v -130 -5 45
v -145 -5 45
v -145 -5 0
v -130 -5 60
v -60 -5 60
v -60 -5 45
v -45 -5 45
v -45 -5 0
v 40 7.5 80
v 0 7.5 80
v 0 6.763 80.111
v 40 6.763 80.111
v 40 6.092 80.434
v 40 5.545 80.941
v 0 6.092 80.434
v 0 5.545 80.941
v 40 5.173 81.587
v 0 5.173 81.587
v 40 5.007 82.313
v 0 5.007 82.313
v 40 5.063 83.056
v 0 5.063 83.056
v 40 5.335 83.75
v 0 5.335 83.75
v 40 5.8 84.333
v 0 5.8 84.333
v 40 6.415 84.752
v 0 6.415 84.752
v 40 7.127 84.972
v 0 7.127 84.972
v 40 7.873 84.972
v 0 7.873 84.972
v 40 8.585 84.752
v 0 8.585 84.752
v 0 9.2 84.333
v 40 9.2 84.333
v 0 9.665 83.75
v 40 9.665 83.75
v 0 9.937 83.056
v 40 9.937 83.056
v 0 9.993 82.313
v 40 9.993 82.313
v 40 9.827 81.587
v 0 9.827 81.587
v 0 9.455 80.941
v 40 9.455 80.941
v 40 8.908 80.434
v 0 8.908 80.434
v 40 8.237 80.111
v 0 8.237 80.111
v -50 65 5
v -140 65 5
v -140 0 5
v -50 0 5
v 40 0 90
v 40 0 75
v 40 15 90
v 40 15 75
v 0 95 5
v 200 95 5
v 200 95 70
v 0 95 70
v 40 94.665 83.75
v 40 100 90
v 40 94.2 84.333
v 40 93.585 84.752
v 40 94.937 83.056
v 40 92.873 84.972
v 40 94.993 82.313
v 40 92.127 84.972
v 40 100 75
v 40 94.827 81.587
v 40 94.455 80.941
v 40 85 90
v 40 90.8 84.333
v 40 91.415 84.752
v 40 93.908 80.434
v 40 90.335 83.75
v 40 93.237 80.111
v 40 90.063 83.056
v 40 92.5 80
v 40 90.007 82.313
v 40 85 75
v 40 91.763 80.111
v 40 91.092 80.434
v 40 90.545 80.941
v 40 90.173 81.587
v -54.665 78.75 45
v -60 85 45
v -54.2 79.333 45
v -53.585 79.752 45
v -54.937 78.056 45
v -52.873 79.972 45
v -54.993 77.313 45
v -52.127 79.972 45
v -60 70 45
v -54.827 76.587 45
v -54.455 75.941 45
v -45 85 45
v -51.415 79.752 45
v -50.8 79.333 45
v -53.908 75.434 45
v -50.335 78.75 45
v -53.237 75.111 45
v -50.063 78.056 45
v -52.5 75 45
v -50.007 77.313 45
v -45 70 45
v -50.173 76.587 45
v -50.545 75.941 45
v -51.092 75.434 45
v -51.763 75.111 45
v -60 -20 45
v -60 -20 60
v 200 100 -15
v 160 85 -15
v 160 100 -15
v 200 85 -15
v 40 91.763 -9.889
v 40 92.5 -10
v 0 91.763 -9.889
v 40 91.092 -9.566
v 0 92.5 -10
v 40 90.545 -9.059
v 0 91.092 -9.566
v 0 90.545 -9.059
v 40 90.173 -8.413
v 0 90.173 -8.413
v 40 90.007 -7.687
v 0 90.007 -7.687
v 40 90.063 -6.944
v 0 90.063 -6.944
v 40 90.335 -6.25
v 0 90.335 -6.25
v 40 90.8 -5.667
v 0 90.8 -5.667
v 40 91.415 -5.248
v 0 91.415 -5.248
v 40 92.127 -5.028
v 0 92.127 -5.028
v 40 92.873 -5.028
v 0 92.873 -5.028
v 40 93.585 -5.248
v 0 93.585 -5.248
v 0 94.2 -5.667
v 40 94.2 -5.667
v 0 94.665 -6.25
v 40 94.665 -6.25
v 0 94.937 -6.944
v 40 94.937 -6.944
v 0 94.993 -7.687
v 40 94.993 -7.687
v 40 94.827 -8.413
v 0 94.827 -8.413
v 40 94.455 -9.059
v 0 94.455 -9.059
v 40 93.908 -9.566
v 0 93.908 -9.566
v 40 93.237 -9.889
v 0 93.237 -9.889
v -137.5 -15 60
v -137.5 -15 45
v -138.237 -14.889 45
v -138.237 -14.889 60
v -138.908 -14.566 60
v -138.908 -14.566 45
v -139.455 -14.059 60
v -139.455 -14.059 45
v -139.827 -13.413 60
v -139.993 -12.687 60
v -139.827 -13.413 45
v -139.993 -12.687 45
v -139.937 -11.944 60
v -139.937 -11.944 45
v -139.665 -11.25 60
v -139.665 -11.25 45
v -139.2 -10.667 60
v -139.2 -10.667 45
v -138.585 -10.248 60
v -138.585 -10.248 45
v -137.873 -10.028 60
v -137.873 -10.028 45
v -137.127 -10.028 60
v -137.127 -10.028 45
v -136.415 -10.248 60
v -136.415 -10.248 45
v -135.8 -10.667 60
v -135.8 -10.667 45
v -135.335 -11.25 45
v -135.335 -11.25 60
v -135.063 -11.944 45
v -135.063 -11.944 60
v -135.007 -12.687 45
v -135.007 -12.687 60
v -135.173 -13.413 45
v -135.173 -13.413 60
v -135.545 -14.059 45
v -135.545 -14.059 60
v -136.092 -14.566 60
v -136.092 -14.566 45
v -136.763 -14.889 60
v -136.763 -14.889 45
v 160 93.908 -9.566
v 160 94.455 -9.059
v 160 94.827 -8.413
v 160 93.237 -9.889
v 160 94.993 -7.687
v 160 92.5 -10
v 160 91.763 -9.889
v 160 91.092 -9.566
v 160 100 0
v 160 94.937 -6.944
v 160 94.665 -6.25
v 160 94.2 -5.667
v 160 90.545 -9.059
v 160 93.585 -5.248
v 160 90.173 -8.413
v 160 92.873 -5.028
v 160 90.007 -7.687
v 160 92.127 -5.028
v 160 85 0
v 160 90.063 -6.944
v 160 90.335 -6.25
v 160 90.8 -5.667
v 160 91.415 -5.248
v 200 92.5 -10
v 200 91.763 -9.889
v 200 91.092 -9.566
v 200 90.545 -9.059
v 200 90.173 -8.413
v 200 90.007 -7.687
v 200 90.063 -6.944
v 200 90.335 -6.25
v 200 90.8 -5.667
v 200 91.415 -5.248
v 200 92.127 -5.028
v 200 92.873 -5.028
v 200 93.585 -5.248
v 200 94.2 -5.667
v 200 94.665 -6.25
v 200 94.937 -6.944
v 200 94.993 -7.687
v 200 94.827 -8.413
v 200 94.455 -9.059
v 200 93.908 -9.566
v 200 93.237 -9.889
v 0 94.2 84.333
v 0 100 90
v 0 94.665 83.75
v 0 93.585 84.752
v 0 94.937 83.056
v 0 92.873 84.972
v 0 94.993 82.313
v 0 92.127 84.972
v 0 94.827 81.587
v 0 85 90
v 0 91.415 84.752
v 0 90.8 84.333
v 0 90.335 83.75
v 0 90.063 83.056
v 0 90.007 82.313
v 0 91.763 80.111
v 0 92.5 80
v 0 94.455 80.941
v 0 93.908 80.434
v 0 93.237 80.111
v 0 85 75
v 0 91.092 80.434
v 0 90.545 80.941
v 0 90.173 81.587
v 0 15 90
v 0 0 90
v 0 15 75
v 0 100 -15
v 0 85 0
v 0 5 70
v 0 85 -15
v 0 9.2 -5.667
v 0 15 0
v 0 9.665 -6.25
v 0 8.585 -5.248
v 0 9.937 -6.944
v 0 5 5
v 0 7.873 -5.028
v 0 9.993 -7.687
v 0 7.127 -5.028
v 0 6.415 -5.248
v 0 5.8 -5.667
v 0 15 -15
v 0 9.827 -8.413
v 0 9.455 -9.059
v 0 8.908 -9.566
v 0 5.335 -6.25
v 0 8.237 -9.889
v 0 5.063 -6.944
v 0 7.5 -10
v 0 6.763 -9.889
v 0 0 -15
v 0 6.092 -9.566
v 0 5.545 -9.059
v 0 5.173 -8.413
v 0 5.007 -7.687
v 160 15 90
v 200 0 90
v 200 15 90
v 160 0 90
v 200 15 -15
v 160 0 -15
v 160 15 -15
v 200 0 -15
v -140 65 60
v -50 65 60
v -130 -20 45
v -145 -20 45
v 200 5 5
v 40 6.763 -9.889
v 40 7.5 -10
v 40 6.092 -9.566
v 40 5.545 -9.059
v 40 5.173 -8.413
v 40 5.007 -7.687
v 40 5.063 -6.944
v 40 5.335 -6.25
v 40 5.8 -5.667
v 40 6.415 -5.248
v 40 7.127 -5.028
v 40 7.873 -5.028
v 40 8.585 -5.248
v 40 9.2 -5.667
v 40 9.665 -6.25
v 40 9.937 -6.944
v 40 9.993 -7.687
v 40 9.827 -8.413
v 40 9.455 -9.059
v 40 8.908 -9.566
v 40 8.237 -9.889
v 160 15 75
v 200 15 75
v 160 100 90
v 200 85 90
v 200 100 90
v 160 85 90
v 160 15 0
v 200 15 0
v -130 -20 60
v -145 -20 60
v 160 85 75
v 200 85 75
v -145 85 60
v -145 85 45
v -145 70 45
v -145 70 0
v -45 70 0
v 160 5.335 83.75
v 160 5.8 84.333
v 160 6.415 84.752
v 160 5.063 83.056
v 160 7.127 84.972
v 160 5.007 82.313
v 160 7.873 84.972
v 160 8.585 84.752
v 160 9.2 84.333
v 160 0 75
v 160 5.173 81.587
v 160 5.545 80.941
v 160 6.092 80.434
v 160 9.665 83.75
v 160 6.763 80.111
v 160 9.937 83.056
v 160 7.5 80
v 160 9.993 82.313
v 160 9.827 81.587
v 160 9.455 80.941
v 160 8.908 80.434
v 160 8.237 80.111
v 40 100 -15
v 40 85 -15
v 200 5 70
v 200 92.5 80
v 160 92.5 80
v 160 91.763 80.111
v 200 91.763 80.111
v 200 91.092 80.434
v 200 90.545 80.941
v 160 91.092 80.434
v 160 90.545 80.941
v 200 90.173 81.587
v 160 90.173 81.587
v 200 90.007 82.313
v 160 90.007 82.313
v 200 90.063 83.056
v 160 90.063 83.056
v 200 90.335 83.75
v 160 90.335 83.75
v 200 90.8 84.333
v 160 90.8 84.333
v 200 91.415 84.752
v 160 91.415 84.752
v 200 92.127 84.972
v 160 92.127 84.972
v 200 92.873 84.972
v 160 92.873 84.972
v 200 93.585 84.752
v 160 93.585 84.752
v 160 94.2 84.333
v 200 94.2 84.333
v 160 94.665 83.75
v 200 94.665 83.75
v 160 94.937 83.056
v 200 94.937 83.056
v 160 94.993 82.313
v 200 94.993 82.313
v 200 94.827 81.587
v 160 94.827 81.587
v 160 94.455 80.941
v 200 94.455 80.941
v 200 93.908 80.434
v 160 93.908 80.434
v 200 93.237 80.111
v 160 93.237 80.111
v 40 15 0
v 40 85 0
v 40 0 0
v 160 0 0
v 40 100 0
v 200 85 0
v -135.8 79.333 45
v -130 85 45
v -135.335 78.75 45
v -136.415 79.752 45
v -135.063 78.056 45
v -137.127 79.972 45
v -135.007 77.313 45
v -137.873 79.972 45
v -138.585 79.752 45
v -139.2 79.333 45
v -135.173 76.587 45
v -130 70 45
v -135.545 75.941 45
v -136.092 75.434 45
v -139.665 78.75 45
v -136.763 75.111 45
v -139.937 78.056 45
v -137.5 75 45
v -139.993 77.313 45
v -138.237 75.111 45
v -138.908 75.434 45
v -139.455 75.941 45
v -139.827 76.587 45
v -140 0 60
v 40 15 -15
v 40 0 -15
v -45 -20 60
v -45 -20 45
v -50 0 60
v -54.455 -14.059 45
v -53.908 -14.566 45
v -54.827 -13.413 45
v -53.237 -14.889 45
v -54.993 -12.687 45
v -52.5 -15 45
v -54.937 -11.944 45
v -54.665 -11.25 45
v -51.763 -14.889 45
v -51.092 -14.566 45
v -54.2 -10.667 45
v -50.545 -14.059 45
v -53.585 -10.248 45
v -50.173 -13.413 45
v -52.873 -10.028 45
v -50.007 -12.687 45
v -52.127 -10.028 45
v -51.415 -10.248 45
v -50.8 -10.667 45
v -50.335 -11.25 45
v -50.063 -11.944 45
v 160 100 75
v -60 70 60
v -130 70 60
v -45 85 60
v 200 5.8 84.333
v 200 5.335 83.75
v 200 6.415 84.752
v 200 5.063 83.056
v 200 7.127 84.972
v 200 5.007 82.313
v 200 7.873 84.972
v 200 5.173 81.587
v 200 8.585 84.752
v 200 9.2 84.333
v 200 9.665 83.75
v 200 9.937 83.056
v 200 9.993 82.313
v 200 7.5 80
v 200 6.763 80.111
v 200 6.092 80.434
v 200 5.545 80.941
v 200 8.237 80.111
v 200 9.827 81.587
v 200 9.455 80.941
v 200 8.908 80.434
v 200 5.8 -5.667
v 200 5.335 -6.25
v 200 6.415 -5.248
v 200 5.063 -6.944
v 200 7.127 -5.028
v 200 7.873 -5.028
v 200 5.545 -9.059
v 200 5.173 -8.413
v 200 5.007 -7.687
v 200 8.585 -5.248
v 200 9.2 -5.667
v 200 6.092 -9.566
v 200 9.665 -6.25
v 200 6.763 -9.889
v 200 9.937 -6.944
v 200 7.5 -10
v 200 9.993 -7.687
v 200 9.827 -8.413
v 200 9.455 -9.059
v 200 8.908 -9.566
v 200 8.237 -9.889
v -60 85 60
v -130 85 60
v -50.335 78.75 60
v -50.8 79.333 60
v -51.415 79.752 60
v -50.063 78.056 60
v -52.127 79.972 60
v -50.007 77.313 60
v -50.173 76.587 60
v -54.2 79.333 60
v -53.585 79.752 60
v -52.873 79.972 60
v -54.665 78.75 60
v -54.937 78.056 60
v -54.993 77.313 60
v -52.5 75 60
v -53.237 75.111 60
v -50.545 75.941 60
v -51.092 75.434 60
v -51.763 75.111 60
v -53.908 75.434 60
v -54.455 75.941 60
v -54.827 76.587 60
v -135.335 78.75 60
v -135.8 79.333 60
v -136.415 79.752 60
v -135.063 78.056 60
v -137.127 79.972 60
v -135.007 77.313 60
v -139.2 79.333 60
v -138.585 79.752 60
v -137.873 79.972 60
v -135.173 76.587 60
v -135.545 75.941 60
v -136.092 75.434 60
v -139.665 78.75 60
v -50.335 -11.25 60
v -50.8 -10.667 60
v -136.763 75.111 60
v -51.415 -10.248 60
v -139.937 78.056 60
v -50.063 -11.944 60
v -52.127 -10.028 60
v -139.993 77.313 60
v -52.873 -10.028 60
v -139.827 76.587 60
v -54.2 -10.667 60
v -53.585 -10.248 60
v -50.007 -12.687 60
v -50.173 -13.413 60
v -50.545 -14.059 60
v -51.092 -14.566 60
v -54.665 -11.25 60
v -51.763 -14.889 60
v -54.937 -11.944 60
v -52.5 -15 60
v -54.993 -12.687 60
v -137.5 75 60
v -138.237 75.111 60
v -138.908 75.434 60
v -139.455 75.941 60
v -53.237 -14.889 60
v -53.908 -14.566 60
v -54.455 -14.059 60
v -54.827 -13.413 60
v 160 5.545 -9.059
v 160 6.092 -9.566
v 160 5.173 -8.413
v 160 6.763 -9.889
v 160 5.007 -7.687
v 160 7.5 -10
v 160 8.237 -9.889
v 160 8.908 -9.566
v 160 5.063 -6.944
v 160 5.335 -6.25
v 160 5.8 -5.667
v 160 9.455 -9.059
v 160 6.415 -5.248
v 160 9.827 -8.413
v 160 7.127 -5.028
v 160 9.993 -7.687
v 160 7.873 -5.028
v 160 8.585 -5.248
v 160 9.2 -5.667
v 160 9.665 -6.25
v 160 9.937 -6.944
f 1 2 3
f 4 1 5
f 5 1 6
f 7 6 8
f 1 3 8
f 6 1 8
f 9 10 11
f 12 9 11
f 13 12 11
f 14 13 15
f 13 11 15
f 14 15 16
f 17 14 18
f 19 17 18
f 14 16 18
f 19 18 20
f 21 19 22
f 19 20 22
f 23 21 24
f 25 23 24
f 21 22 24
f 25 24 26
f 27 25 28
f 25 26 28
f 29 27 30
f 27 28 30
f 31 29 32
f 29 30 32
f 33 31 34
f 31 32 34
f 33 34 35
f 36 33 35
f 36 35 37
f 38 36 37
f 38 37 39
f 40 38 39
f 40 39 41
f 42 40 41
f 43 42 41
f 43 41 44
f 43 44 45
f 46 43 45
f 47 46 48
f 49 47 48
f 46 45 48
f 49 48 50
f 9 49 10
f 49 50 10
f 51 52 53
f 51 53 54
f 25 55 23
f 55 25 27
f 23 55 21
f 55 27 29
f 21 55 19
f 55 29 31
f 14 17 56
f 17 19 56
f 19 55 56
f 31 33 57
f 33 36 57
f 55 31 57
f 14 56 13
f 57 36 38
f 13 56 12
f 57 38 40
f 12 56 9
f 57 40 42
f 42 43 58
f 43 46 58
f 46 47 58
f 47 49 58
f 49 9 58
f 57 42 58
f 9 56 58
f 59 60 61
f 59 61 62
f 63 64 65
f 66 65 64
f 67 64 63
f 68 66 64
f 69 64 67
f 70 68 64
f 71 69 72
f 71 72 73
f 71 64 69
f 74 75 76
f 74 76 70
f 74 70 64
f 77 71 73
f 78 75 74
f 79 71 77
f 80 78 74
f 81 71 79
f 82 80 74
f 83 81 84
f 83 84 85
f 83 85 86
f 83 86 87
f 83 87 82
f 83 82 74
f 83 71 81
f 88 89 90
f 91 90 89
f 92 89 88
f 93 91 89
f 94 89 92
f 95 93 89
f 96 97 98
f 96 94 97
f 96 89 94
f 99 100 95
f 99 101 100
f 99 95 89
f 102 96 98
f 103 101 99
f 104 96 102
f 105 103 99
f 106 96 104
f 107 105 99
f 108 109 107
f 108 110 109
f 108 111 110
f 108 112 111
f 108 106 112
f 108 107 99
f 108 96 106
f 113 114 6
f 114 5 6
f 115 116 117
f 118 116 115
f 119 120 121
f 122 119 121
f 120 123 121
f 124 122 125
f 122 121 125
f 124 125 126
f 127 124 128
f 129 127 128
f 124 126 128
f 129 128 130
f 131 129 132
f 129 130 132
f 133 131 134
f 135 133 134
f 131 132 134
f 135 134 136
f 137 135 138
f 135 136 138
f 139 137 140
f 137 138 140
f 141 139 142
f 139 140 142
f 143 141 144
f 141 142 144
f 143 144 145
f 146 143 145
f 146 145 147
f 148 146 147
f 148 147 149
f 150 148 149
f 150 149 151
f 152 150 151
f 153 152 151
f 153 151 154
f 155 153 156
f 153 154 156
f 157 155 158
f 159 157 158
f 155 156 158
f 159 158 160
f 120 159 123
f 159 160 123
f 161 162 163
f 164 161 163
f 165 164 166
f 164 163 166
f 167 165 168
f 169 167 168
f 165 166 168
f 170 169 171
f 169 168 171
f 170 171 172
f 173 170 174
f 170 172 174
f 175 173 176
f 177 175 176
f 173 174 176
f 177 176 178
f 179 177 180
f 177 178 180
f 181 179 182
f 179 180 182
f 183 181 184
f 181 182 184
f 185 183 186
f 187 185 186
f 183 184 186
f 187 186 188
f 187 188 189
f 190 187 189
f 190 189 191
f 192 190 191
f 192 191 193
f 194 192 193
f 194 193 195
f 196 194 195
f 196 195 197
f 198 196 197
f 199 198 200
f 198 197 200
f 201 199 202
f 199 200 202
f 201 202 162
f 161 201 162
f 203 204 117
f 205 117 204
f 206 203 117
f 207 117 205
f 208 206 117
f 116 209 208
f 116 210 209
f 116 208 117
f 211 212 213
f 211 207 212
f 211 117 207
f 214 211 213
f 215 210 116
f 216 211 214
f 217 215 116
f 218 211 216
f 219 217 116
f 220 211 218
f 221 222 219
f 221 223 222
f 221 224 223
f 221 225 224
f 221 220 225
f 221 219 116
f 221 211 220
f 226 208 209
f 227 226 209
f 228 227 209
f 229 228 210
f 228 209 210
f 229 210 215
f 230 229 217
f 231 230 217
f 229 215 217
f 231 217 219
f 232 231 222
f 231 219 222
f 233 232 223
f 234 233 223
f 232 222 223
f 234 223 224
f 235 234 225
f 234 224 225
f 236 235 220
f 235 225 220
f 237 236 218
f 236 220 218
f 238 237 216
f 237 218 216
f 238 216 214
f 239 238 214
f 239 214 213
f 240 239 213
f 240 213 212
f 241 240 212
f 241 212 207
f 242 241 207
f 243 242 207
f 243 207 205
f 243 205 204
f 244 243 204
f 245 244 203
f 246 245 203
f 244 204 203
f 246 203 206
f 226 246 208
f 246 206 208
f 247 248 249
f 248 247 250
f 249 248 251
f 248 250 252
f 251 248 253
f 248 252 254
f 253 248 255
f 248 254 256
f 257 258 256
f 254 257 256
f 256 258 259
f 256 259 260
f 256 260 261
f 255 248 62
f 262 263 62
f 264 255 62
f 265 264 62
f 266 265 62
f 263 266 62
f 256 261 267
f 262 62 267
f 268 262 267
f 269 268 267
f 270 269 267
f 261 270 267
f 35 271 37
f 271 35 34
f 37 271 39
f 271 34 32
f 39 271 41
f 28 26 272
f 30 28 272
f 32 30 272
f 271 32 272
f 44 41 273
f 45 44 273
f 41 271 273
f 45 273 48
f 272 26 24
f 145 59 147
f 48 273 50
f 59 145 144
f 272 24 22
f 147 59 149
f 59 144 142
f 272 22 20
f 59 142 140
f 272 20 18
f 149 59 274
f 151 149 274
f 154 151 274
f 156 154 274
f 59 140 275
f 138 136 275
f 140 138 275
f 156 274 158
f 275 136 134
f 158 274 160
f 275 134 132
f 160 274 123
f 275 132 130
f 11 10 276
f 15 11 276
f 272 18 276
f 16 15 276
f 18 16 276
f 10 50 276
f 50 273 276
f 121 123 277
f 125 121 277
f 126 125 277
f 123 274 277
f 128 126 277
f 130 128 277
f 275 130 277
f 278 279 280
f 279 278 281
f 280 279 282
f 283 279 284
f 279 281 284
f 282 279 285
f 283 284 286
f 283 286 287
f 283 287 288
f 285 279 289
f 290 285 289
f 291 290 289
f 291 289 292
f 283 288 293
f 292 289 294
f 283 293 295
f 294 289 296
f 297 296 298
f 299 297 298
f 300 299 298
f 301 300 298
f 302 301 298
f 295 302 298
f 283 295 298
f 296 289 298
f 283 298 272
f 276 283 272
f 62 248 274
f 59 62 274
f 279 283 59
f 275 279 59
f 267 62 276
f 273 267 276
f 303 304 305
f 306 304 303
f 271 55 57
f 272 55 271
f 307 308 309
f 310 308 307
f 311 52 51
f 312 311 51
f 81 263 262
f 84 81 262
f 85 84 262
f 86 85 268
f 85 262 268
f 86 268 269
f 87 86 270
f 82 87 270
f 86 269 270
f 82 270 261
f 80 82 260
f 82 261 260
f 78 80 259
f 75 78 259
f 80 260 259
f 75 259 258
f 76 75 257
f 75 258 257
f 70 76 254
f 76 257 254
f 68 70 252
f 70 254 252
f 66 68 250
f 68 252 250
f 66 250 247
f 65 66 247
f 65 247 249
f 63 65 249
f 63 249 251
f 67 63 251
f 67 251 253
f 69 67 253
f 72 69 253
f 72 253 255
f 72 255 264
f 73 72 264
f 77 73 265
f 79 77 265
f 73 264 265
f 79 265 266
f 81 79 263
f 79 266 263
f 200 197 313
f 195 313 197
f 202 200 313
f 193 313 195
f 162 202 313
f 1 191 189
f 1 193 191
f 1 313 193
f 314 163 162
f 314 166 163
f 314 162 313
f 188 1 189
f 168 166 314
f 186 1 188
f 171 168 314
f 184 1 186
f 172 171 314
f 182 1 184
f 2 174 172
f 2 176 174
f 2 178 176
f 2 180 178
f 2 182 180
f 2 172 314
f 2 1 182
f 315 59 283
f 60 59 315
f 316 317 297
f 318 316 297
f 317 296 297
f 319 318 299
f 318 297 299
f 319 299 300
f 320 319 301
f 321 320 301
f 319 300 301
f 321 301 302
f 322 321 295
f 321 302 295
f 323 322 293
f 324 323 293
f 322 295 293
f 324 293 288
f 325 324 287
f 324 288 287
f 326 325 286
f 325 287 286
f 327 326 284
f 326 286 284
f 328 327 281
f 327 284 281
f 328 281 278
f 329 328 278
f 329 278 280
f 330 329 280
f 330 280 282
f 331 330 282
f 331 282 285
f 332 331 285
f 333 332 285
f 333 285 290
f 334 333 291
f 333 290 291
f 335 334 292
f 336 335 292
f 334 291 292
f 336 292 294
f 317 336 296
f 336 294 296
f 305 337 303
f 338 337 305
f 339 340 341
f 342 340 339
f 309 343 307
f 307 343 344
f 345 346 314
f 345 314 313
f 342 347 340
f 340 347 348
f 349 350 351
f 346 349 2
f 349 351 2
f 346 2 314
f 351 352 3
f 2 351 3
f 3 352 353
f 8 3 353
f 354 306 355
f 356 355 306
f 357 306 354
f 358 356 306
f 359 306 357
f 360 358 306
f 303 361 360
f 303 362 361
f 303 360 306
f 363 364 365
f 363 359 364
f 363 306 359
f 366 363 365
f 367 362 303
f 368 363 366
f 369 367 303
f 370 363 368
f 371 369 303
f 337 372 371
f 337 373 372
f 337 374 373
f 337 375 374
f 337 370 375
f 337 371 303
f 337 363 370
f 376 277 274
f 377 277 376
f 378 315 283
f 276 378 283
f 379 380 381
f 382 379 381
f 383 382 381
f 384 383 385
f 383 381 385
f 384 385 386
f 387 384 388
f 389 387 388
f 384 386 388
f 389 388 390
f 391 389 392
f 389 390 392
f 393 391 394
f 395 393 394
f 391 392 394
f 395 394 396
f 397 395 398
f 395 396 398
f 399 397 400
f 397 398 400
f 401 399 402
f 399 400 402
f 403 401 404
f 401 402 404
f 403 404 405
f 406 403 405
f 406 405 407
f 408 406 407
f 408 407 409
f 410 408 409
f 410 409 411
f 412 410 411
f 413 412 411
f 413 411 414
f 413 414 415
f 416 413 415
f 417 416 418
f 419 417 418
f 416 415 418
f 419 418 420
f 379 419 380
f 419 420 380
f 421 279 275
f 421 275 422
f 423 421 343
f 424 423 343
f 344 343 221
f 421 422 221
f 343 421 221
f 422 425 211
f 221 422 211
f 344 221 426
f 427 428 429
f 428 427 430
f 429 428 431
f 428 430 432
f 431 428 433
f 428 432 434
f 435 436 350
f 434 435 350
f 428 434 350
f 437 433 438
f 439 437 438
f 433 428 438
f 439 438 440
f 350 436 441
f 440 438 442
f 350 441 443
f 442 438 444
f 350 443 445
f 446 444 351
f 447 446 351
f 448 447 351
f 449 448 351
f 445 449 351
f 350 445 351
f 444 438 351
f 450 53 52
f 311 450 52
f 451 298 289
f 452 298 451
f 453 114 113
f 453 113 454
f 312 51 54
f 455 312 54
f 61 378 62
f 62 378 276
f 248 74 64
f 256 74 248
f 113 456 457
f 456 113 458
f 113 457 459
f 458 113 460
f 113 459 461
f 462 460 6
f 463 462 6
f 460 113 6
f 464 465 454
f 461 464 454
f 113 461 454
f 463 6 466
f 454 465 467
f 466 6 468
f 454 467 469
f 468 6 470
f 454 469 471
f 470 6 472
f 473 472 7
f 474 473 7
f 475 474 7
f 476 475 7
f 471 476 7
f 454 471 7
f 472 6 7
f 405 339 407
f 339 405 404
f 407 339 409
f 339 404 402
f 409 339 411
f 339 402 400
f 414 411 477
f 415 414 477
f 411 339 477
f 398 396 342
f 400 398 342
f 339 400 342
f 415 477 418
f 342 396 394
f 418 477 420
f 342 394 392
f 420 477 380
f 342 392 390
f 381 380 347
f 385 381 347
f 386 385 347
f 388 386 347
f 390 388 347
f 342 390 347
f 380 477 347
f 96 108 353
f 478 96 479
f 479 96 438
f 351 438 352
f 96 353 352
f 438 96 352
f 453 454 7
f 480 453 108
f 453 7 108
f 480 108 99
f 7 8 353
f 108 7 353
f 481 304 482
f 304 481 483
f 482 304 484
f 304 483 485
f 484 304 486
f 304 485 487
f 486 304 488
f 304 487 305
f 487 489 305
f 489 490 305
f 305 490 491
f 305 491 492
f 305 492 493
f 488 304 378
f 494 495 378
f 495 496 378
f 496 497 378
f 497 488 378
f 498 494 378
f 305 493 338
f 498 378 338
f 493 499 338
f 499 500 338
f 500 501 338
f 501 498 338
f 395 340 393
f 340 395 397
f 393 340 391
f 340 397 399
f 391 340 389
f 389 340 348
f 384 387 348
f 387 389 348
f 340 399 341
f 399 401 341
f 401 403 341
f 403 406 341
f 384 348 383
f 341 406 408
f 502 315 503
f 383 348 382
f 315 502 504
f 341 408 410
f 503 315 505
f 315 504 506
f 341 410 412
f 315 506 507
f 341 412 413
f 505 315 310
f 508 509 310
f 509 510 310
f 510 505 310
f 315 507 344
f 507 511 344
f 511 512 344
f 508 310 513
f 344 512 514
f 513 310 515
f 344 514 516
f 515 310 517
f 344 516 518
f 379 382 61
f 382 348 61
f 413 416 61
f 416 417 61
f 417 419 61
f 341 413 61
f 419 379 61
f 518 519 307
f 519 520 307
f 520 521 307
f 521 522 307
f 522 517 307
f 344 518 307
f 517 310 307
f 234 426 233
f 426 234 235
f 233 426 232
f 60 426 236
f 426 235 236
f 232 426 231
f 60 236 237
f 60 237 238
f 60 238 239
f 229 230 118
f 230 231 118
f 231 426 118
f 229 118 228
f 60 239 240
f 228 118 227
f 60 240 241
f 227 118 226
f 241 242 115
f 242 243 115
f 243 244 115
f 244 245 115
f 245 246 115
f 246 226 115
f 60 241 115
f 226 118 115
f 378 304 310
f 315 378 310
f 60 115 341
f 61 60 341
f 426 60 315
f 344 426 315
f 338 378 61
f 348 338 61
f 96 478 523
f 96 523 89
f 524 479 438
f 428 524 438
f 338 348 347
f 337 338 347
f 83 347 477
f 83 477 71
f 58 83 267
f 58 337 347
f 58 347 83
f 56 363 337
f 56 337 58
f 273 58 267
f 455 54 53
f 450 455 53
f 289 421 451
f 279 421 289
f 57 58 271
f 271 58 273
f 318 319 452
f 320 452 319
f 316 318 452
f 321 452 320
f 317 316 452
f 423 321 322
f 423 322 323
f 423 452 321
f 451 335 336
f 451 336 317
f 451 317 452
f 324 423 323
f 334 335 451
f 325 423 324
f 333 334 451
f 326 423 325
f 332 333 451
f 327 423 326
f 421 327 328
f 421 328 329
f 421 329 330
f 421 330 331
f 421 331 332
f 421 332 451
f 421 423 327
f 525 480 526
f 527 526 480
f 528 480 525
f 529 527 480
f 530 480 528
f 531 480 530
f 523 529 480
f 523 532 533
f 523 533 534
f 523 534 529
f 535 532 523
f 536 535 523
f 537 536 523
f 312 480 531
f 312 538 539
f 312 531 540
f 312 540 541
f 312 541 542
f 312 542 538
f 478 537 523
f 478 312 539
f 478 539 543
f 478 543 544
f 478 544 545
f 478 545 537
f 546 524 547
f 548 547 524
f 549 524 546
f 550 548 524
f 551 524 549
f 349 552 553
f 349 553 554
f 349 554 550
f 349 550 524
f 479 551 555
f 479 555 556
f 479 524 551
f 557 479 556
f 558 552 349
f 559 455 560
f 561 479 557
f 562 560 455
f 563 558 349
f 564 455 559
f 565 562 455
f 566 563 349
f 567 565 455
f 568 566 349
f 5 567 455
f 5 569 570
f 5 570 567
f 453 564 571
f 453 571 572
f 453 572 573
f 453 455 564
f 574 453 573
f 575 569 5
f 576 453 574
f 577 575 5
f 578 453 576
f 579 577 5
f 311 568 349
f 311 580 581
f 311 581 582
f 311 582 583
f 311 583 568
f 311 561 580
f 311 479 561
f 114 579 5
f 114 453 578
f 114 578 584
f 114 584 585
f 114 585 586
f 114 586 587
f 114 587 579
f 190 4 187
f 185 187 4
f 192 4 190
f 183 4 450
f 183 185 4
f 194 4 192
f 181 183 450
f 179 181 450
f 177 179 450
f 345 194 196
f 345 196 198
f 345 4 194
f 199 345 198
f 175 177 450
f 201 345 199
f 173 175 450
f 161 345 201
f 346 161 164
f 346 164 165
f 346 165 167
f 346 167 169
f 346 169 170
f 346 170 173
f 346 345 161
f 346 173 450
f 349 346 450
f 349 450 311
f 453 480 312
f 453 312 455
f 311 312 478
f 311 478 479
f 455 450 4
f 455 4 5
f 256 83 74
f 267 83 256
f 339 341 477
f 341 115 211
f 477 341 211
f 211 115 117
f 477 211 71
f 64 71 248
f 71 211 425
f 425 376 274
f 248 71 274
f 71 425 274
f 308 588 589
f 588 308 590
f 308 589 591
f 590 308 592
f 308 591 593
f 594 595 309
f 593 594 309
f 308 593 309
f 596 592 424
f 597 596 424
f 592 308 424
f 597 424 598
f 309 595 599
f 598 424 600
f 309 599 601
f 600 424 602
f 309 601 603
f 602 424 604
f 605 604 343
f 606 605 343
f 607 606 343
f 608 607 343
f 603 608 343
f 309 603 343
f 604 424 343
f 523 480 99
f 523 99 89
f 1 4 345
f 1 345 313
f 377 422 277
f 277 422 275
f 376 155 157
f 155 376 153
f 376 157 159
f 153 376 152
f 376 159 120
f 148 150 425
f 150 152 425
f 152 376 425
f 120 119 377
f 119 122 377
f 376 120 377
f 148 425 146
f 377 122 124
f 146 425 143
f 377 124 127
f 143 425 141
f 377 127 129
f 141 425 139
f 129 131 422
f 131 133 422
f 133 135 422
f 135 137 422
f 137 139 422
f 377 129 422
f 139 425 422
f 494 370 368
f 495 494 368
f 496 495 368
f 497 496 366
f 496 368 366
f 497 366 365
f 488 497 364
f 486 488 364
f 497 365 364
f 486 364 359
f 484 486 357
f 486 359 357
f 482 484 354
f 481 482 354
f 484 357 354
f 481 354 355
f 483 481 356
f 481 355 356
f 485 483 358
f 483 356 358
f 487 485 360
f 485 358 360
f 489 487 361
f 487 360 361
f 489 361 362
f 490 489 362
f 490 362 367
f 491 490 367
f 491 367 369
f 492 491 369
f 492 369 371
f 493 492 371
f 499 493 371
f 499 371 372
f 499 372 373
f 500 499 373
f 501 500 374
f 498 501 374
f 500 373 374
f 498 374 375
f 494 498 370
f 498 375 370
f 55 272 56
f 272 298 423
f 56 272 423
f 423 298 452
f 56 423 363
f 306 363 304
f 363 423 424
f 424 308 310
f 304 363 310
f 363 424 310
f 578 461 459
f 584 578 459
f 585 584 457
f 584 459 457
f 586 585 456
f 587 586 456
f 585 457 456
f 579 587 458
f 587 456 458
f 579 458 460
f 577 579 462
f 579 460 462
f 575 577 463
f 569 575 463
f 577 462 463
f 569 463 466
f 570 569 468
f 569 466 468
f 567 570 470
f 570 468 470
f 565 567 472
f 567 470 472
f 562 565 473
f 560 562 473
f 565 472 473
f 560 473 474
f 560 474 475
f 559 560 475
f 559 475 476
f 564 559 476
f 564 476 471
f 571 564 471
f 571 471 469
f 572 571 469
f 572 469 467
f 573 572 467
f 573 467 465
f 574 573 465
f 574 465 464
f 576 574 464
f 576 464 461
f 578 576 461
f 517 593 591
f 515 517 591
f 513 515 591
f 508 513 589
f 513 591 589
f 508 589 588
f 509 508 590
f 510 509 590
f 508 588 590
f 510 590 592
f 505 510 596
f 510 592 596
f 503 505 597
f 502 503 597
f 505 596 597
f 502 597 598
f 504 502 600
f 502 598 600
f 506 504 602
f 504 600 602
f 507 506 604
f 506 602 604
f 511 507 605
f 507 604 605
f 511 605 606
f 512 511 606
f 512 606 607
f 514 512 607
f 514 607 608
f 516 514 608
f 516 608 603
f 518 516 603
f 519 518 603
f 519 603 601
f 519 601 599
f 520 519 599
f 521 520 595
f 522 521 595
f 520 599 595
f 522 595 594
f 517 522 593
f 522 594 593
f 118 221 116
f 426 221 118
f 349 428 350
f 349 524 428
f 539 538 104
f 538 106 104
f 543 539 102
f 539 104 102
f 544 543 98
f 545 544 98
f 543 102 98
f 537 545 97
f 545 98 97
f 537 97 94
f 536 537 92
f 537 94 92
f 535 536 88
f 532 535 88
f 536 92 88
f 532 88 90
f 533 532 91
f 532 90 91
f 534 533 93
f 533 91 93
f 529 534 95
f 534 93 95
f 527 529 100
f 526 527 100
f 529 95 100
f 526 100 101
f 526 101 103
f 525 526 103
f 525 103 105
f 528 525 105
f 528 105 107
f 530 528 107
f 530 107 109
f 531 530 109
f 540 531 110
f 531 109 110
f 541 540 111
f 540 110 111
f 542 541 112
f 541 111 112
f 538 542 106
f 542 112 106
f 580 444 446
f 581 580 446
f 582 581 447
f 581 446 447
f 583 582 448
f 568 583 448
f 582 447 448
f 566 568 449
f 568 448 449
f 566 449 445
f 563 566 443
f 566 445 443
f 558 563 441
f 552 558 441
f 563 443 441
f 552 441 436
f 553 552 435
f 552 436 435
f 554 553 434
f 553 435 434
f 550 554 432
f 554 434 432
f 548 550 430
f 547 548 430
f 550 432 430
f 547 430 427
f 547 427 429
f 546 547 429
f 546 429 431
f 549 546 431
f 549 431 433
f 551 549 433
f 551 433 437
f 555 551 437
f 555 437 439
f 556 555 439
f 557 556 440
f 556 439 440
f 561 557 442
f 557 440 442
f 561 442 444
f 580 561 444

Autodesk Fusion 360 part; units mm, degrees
sketch "Sketch1" plane through (0, 0, 0) normal (0, 0, 1) x (1, 0, 0)
  line L0 (0, 0) -> (330, 0)
  line L1 (330, 0) -> (330, 100)
  line L2 (330, 100) -> (0, 100)
  line L3 (0, 100) -> (0, 0)
  dimension "d1" = 330
  dimension "d2" = 100
sketch "Sketch2" plane through (0, 0, 0) normal (0, 0, 1) x (1, 0, 0)
  line L0 (0, 0) -> (200, 0)
  line L1 (200, 0) -> (200, 100)
  line L2 (200, 100) -> (0, 100)
  line L3 (0, 100) -> (0, 0)
  dimension "d7" = 200
  dimension "d8" = 100
extrude "Extrude3" add sketch "Sketch2" along normal blind 5 makes body 1
sketch "Sketch3" plane through (0, 0, 5) normal (0, 0, 1) x (-1, 0, 0)
  line L0 (0, -100) -> (0, 0)
  line L1 (0, 0) -> (-200, 0)
  line L2 (-200, 0) -> (-200, -100)
  line L3 (-200, -100) -> (0, -100)
  line L4 (0, 0) -> (-200, 0)
  line L5 (-200, 0) -> (-200, -5)
  line L6 (-200, -5) -> (0, -5)
  line L7 (0, -5) -> (0, 0)
  line L8 (0, -100) -> (-200, -100)
  line L9 (-200, -100) -> (-200, -95)
  line L10 (-200, -95) -> (0, -95)
  line L11 (0, -95) -> (0, -100)
  dimension "d11" = 5
  dimension "d12" = 5
extrude "Extrude4" add sketch "Sketch3" along normal blind 65 contours L0 L2 L3 L8 L9 L10 L11 | L0 L1 L2 L4 L5 L6 L7 bodies 1
sketch "Sketch4" plane through (0, 0, 70) normal (0, 0, 1) x (-1, 0, 0)
  line L0 (0, -5) -> (0, 0)
  line L1 (0, 0) -> (-200, 0)
  line L2 (-200, 0) -> (-200, -5)
  line L3 (-200, -5) -> (0, -5)
  line L4 (0, 0) -> (-200, 0)
  line L5 (-200, 0) -> (-200, -100)
  line L6 (-200, -100) -> (0, -100)
  line L7 (0, -100) -> (0, 0)
extrude "Extrude5" add sketch "Sketch4" along normal blind 5 bodies 1
sketch "Sketch5" plane through (0, 0, 0) normal (0, 0, -1) x (1, 0, 0)
  line L0 (0, 0) -> (0, -100)
  line L1 (0, -100) -> (200, -100)
  line L2 (200, -100) -> (200, 0)
  line L3 (200, 0) -> (0, 0)
  line L4 (200, 0) -> (160, 0)
  line L5 (160, 0) -> (160, -15)
  line L6 (160, -15) -> (200, -15)
  line L7 (200, -15) -> (200, 0)
  line L8 (200, -100) -> (160, -100)
  line L9 (160, -100) -> (160, -85)
  line L10 (160, -85) -> (200, -85)
  line L11 (200, -85) -> (200, -100)
  line L12 (0, -100) -> (40, -100)
  line L13 (40, -100) -> (40, -85)
  line L14 (40, -85) -> (0, -85)
  line L15 (0, -85) -> (0, -100)
  line L16 (0, 0) -> (40, 0)
  line L17 (40, 0) -> (40, -15)
  line L18 (40, -15) -> (0, -15)
  line L19 (0, -15) -> (0, 0)
  dimension "d17" = 15
  dimension "d18" = 40
  dimension "d19" = 15
  dimension "d20" = 15
  dimension "d21" = 40
  dimension "d22" = 15
extrude "Extrude6" add sketch "Sketch5" along normal blind 15 contours L0 L3 L16 L17 L18 L19 | L0 L1 L12 L13 L14 L15 | L2 L3 L4 L5 L6 L7 | L1 L2 L8 L9 L10 L11 bodies 1
sketch "Sketch6" plane through (0, 0, 75) normal (0, 0, 1) x (-1, 0, 0)
  line L0 (0, -100) -> (0, 0)
  line L1 (0, 0) -> (-200, 0)
  line L2 (-200, 0) -> (-200, -100)
  line L3 (-200, -100) -> (0, -100)
  line L4 (-200, -100) -> (-160, -100)
  line L5 (-160, -100) -> (-160, -85)
  line L6 (-160, -85) -> (-200, -85)
  line L7 (-200, -85) -> (-200, -100)
  line L8 (-200, 0) -> (-160, 0)
  line L9 (-160, 0) -> (-160, -15)
  line L10 (-160, -15) -> (-200, -15)
  line L11 (-200, -15) -> (-200, 0)
  line L12 (0, 0) -> (-40, 0)
  line L13 (-40, 0) -> (-40, -15)
  line L14 (-40, -15) -> (0, -15)
  line L15 (0, -15) -> (0, 0)
  line L16 (0, -100) -> (-40, -100)
  line L17 (-40, -100) -> (-40, -85)
  line L18 (-40, -85) -> (0, -85)
  line L19 (0, -85) -> (0, -100)
  dimension "d25" = 40
  dimension "d26" = 15
  dimension "d27" = 15
  dimension "d28" = 15
  dimension "d29" = 40
  dimension "d30" = 15
extrude "Extrude7" add sketch "Sketch6" along normal blind 15 contours L0 L3 L16 L17 L18 L19 | L0 L1 L12 L13 L14 L15 | L2 L3 L4 L5 L6 L7 | L1 L2 L8 L9 L10 L11 bodies 1
hole "Hole1" at (200, 92.5, 82.5) direction (-1, 0, 0) diameter 5 depth 500 tip angle 118 bodies 1
hole "Hole2" at (200, 7.5, 82.5) direction (-1, 0, 0) diameter 5 depth 500 tip angle 118 bodies 1
hole "Hole3" at (200, 92.5, -7.5) direction (-1, 0, 0) diameter 5 depth 500 tip angle 118 bodies 1
hole "Hole4" at (200, 7.5, -7.5) direction (-1, 0, 0) diameter 5 depth 500 tip angle 118 bodies 1
sketch "Sketch7" plane through (0, 0, 0) normal (0, 0, 1) x (1, 0, 0)
  line L0 (-50, 0) -> (-140, 0)
  line L1 (-140, 0) -> (-140, 65)
  line L2 (-140, 65) -> (-50, 65)
  line L3 (-50, 65) -> (-50, 0)
  line L4 (-45, -5) -> (-145, -5)
  line L5 (-145, -5) -> (-145, 70)
  line L6 (-145, 70) -> (-45, 70)
  line L7 (-45, 70) -> (-45, -5)
  dimension "d53" = 90
  dimension "d54" = 65
extrude "Extrude1" add sketch "Sketch7" along normal blind 5 separate body contours L0 L1 L2 L3 | L4 L5 L6 L7 makes body 2 in component "Component"
sketch "Sketch8" plane through (0, 0, 5) normal (0, 0, 1) x (-1, 0, 0)
  line L0 (45, -70) -> (145, -70)
  line L1 (145, -70) -> (145, 5)
  line L2 (145, 5) -> (45, 5)
  line L3 (45, 5) -> (45, -70)
  line L4 (140, -65) -> (50, -65)
  line L5 (50, -65) -> (50, 0)
  line L6 (50, 0) -> (140, 0)
  line L7 (140, 0) -> (140, -65)
extrude "Extrude2" add sketch "Sketch8" along normal blind 55 bodies 2 in component "Component"
sketch "Sketch9" plane through (0, -5, 0) normal (0, -1, 0) x (1, 0, 0)
  line L0 (-145, 0) -> (-45, 0)
  line L1 (-45, 0) -> (-45, 60)
  line L2 (-45, 60) -> (-145, 60)
  line L3 (-145, 60) -> (-145, 0)
  line L4 (-145, 60) -> (-130, 60)
  line L5 (-130, 60) -> (-130, 45)
  line L6 (-130, 45) -> (-145, 45)
  line L7 (-145, 45) -> (-145, 60)
  line L8 (-45, 60) -> (-60, 60)
  line L9 (-60, 60) -> (-60, 45)
  line L10 (-60, 45) -> (-45, 45)
  line L11 (-45, 45) -> (-45, 60)
extrude "Extrude3'" add sketch "Sketch9" along normal blind 15 contours L2 L3 L4 L5 L6 L7 | L1 L2 L8 L9 L10 L11 bodies 2 in component "Component"
sketch "Sketch10" plane through (0, 70, 0) normal (0, 1, 0) x (-1, 0, 0)
  line L0 (45, 0) -> (145, 0)
  line L1 (145, 0) -> (145, 60)
  line L2 (145, 60) -> (45, 60)
  line L3 (45, 60) -> (45, 0)
  line L4 (45, 60) -> (60, 60)
  line L5 (60, 60) -> (60, 45)
  line L6 (60, 45) -> (45, 45)
  line L7 (45, 45) -> (45, 60)
  line L8 (145, 60) -> (130, 60)
  line L9 (130, 60) -> (130, 45)
  line L10 (130, 45) -> (145, 45)
  line L11 (145, 45) -> (145, 60)
  dimension "d61" = 15
  dimension "d62" = 15
  dimension "d63" = 15
  dimension "d64" = 15
extrude "Extrude4'" add sketch "Sketch10" along normal blind 15 contours L2 L3 L4 L5 L6 L7 | L1 L2 L8 L9 L10 L11 bodies 2 in component "Component"
hole "Hole1'" at (-137.5, 77.5, 60) direction (0, 0, -1) diameter 5 depth 500 tip angle 118 bodies 2 in component "Component"
hole "Hole2'" at (-52.5, 77.5, 60) direction (0, 0, -1) diameter 5 depth 500 tip angle 118 bodies 2 in component "Component"
hole "Hole3'" at (-137.5, -12.5, 60) direction (0, 0, -1) diameter 5 depth 500 tip angle 118 bodies 2 in component "Component"
hole "Hole4'" at (-52.5, -12.5, 60) direction (0, 0, -1) diameter 5 depth 500 tip angle 118 bodies 2 in component "Component"
component "Component" placed x (1, 0, 0) y (0, 1, 0) z (0, 0, 1) at (0, 0, 0)
